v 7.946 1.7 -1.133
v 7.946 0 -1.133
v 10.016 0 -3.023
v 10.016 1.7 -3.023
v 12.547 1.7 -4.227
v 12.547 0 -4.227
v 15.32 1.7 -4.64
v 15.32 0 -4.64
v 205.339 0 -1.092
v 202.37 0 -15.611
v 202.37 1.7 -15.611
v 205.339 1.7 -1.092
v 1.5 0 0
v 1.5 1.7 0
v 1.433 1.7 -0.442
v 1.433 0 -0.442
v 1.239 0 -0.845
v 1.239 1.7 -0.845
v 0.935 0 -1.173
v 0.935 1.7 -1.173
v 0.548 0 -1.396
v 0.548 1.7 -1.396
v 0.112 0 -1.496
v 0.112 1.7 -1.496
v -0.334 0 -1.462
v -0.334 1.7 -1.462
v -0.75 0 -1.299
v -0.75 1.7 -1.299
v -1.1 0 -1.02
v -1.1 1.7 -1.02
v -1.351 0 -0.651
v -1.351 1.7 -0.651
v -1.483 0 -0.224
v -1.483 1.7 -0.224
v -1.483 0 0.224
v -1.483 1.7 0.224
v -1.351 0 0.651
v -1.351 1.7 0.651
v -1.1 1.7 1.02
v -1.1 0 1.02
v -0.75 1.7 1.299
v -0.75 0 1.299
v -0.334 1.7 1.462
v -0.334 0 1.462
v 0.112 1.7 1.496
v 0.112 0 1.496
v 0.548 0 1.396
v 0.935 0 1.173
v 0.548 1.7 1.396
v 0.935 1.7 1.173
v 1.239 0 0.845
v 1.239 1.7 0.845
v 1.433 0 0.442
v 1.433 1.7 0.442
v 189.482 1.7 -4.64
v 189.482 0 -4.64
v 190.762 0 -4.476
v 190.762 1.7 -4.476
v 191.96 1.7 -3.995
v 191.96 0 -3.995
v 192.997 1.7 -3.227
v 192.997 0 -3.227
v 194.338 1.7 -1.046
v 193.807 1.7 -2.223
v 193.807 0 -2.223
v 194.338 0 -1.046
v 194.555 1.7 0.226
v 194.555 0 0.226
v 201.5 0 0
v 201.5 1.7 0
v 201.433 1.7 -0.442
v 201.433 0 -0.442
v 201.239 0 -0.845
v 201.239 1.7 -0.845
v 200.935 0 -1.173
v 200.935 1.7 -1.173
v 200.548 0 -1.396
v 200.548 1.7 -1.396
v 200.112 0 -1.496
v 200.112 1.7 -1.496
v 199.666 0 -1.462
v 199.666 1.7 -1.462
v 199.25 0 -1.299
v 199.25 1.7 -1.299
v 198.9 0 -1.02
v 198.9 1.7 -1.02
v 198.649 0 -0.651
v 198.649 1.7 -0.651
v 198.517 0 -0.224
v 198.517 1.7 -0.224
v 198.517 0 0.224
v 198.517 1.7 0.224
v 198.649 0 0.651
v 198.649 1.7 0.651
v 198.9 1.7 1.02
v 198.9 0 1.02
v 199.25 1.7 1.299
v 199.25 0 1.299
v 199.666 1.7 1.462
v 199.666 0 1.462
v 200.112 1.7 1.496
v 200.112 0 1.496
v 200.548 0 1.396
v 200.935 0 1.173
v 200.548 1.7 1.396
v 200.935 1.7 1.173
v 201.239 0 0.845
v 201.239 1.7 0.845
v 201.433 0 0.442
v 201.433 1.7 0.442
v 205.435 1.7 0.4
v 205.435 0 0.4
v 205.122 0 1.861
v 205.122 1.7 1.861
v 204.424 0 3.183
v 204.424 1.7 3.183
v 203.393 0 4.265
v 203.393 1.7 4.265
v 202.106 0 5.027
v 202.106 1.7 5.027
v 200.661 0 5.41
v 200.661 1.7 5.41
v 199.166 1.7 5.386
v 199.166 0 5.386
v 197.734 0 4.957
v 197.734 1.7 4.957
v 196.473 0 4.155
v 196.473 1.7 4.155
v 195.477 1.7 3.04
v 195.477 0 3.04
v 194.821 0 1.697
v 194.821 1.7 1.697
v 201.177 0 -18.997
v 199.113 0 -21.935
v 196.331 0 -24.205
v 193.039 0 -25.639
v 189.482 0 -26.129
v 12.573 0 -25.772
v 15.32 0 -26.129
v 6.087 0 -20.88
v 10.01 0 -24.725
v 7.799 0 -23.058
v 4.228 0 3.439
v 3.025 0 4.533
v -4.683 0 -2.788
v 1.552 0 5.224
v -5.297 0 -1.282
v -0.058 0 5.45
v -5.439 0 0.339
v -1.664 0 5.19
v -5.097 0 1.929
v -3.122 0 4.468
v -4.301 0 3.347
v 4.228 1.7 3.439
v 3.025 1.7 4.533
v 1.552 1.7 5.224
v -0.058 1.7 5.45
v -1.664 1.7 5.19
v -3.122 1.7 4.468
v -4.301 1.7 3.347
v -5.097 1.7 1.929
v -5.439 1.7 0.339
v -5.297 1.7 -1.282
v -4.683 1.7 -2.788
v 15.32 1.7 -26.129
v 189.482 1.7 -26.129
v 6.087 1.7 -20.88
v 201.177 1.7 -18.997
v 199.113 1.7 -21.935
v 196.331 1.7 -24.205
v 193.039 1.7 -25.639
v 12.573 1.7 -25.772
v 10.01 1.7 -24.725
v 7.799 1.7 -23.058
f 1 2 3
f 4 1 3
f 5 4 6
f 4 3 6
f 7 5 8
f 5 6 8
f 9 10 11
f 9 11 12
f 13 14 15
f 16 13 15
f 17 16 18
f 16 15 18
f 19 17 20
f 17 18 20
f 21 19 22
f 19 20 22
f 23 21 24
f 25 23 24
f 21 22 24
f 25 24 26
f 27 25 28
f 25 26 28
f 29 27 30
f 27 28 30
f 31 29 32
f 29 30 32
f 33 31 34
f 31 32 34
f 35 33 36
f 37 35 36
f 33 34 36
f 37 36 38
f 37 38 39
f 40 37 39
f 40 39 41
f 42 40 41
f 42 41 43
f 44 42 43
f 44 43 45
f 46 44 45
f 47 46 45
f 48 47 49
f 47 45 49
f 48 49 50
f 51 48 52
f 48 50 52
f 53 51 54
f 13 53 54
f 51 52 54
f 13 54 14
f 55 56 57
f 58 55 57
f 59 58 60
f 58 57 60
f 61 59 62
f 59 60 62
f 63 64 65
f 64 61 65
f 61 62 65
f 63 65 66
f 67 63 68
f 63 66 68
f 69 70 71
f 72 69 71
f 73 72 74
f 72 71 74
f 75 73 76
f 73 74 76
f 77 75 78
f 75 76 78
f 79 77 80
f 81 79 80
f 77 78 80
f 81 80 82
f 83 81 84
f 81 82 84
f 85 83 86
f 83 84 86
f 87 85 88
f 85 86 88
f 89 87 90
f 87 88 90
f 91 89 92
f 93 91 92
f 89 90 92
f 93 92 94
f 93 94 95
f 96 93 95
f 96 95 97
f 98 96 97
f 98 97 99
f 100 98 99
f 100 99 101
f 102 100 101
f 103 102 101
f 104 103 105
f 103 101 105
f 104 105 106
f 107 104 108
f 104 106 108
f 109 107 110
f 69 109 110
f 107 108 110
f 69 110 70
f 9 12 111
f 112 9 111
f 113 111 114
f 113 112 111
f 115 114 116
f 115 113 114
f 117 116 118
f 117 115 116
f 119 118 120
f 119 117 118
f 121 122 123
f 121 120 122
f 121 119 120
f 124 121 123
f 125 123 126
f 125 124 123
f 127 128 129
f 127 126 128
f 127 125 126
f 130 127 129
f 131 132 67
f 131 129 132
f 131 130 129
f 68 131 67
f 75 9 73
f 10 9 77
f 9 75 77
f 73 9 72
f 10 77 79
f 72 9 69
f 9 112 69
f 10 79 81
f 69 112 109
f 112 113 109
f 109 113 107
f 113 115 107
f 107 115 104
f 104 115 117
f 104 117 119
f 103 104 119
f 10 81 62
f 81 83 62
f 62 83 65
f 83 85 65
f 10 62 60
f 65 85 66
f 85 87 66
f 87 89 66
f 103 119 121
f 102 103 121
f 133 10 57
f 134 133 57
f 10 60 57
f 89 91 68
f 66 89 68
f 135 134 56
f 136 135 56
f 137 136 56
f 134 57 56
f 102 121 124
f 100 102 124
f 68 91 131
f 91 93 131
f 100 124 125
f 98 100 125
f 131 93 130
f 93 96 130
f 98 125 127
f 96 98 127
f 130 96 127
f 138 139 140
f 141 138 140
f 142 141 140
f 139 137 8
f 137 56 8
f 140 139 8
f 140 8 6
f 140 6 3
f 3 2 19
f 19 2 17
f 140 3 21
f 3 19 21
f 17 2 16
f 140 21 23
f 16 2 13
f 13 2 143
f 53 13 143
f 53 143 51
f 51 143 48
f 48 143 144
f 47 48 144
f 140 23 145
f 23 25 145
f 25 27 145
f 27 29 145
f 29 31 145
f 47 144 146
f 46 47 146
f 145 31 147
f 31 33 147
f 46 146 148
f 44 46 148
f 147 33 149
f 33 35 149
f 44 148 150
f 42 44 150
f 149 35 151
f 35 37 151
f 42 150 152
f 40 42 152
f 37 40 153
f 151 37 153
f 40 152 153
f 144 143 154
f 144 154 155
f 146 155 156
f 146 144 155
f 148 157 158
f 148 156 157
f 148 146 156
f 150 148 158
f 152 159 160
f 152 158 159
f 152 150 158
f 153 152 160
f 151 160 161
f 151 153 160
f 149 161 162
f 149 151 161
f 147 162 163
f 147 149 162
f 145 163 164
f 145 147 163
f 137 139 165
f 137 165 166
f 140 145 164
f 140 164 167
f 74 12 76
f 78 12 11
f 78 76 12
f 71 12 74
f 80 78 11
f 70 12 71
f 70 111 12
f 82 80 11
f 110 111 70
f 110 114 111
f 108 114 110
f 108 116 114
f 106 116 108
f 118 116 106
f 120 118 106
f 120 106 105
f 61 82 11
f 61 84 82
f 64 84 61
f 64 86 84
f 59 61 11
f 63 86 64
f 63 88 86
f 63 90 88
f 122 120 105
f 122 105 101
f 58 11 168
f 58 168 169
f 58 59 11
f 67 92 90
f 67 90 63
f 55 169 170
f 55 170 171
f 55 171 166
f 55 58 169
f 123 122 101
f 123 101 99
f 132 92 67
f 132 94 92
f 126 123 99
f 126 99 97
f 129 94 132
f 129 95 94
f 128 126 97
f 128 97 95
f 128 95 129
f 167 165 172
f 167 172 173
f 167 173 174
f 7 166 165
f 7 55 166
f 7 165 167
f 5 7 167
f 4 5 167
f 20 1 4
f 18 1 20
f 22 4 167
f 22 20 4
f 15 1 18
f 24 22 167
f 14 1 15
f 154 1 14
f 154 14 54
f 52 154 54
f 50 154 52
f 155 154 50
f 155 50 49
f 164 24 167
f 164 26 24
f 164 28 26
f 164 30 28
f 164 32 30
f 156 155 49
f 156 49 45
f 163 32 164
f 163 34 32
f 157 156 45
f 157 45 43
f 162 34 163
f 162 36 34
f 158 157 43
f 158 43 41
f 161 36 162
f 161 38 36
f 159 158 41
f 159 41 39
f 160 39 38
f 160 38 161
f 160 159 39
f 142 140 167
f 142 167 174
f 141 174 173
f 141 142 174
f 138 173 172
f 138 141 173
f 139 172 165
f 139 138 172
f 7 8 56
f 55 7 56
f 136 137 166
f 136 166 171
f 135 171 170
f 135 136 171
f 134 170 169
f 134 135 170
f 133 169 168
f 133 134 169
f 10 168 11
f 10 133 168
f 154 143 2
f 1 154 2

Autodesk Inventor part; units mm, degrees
ref_plane "YZ Plane" through (0, 0, 0) normal (1, 0, 0) x (0, 1, 0)
ref_plane "XZ Plane" through (0, 0, 0) normal (0, 1, 0) x (-1, 0, 0)
ref_plane "XY Plane" through (0, 0, 0) normal (0, 0, 1) x (1, 0, 0)
sketch "Sketch1" plane through (0, 0, 0) normal (0, 1, 0) x (-1, 0, 0)
  arc A0 (4.6831, -2.7877) -> (-4.2282, 3.4387) centre (0, 0) ccw
  line L0 (4.6831, -2.7877) -> (-6.0873, -20.8805)
  line L1 (-4.2282, 3.4387) -> (-7.9464, -1.1331)
  arc A1 (-15.3196, -26.129) -> (-6.0873, -20.8805) centre (-15.3196, -15.3847) ccw
  arc A2 (-15.3196, -4.6405) -> (-7.9464, -1.1331) centre (-15.3196, 4.8633) ccw
  line L2 (-15.3196, -26.129) -> (-189.4823, -26.129)
  line L3 (-15.3196, -4.6405) -> (-189.4823, -4.6405)
  arc A3 (-194.5547, 0.2259) -> (-205.3394, -1.0922) centre (-200, 0) ccw
  arc A4 (-194.5547, 0.2259) -> (-189.4823, -4.6405) centre (-189.4823, 0.4363) ccw
  arc A5 (-202.3696, -15.6109) -> (-189.4823, -26.129) centre (-189.4823, -12.9748) ccw
  line L4 (-202.3696, -15.6109) -> (-205.3394, -1.0922)
  point P0 (-6.0873, 1.1528)
  point P1 (-10.0096, -24.7251)
  point P2 (-0.7021, -11.8341)
  dimension "d0" = 10.9
  dimension "d1" = 10.9
  dimension "d2" = 200
  dimension "d3" = 0
  dimension "d6" = 0
  dimension "d7" = 0
  dimension "d8" = 0
  dimension "d9" = 174.1627
  dimension "d10" = 9.3075
  dimension "d11" = 13.1542
extrude "Extrusion1" add sketch "Sketch1" along normal blind 1.7
sketch "Sketch2" plane through (0, 1.7, 0) normal (0, 1, 0) x (1, 0, 0)
  arc A0 (-4.6831, 2.7877) -> (4.2282, -3.4387) centre (0, 0) ccw projected
  circle A1 centre (0, 0) radius 1.5
  arc A2 (194.5547, -0.2259) -> (205.3394, 1.0922) centre (200, 0) ccw projected
  circle A3 centre (200, 0) radius 1.5
  dimension "d14" = 3
  dimension "d15" = 3
extrude "Extrusion2" cut sketch "Sketch2" against normal blind 1.7
equation "\"BendRadius\" = Thickness"
equation "\"BendReliefWidth\" = Thickness"
equation "\"BendReliefDepth\" = 0.5 * Thickness"
equation "\"CornerReliefSize\" = 4 * Thickness"
equation "\"MinimumRemnant\" = 2 * Thickness"
equation "\"TransitionRadius\" = BendRadius"
equation "\"JacobiRadiusSize\" = BendRadius"
equation "\"GapSize\" = Thickness"
equation "\"Thickness\" = 3.048"
properties part number "A3P1"
